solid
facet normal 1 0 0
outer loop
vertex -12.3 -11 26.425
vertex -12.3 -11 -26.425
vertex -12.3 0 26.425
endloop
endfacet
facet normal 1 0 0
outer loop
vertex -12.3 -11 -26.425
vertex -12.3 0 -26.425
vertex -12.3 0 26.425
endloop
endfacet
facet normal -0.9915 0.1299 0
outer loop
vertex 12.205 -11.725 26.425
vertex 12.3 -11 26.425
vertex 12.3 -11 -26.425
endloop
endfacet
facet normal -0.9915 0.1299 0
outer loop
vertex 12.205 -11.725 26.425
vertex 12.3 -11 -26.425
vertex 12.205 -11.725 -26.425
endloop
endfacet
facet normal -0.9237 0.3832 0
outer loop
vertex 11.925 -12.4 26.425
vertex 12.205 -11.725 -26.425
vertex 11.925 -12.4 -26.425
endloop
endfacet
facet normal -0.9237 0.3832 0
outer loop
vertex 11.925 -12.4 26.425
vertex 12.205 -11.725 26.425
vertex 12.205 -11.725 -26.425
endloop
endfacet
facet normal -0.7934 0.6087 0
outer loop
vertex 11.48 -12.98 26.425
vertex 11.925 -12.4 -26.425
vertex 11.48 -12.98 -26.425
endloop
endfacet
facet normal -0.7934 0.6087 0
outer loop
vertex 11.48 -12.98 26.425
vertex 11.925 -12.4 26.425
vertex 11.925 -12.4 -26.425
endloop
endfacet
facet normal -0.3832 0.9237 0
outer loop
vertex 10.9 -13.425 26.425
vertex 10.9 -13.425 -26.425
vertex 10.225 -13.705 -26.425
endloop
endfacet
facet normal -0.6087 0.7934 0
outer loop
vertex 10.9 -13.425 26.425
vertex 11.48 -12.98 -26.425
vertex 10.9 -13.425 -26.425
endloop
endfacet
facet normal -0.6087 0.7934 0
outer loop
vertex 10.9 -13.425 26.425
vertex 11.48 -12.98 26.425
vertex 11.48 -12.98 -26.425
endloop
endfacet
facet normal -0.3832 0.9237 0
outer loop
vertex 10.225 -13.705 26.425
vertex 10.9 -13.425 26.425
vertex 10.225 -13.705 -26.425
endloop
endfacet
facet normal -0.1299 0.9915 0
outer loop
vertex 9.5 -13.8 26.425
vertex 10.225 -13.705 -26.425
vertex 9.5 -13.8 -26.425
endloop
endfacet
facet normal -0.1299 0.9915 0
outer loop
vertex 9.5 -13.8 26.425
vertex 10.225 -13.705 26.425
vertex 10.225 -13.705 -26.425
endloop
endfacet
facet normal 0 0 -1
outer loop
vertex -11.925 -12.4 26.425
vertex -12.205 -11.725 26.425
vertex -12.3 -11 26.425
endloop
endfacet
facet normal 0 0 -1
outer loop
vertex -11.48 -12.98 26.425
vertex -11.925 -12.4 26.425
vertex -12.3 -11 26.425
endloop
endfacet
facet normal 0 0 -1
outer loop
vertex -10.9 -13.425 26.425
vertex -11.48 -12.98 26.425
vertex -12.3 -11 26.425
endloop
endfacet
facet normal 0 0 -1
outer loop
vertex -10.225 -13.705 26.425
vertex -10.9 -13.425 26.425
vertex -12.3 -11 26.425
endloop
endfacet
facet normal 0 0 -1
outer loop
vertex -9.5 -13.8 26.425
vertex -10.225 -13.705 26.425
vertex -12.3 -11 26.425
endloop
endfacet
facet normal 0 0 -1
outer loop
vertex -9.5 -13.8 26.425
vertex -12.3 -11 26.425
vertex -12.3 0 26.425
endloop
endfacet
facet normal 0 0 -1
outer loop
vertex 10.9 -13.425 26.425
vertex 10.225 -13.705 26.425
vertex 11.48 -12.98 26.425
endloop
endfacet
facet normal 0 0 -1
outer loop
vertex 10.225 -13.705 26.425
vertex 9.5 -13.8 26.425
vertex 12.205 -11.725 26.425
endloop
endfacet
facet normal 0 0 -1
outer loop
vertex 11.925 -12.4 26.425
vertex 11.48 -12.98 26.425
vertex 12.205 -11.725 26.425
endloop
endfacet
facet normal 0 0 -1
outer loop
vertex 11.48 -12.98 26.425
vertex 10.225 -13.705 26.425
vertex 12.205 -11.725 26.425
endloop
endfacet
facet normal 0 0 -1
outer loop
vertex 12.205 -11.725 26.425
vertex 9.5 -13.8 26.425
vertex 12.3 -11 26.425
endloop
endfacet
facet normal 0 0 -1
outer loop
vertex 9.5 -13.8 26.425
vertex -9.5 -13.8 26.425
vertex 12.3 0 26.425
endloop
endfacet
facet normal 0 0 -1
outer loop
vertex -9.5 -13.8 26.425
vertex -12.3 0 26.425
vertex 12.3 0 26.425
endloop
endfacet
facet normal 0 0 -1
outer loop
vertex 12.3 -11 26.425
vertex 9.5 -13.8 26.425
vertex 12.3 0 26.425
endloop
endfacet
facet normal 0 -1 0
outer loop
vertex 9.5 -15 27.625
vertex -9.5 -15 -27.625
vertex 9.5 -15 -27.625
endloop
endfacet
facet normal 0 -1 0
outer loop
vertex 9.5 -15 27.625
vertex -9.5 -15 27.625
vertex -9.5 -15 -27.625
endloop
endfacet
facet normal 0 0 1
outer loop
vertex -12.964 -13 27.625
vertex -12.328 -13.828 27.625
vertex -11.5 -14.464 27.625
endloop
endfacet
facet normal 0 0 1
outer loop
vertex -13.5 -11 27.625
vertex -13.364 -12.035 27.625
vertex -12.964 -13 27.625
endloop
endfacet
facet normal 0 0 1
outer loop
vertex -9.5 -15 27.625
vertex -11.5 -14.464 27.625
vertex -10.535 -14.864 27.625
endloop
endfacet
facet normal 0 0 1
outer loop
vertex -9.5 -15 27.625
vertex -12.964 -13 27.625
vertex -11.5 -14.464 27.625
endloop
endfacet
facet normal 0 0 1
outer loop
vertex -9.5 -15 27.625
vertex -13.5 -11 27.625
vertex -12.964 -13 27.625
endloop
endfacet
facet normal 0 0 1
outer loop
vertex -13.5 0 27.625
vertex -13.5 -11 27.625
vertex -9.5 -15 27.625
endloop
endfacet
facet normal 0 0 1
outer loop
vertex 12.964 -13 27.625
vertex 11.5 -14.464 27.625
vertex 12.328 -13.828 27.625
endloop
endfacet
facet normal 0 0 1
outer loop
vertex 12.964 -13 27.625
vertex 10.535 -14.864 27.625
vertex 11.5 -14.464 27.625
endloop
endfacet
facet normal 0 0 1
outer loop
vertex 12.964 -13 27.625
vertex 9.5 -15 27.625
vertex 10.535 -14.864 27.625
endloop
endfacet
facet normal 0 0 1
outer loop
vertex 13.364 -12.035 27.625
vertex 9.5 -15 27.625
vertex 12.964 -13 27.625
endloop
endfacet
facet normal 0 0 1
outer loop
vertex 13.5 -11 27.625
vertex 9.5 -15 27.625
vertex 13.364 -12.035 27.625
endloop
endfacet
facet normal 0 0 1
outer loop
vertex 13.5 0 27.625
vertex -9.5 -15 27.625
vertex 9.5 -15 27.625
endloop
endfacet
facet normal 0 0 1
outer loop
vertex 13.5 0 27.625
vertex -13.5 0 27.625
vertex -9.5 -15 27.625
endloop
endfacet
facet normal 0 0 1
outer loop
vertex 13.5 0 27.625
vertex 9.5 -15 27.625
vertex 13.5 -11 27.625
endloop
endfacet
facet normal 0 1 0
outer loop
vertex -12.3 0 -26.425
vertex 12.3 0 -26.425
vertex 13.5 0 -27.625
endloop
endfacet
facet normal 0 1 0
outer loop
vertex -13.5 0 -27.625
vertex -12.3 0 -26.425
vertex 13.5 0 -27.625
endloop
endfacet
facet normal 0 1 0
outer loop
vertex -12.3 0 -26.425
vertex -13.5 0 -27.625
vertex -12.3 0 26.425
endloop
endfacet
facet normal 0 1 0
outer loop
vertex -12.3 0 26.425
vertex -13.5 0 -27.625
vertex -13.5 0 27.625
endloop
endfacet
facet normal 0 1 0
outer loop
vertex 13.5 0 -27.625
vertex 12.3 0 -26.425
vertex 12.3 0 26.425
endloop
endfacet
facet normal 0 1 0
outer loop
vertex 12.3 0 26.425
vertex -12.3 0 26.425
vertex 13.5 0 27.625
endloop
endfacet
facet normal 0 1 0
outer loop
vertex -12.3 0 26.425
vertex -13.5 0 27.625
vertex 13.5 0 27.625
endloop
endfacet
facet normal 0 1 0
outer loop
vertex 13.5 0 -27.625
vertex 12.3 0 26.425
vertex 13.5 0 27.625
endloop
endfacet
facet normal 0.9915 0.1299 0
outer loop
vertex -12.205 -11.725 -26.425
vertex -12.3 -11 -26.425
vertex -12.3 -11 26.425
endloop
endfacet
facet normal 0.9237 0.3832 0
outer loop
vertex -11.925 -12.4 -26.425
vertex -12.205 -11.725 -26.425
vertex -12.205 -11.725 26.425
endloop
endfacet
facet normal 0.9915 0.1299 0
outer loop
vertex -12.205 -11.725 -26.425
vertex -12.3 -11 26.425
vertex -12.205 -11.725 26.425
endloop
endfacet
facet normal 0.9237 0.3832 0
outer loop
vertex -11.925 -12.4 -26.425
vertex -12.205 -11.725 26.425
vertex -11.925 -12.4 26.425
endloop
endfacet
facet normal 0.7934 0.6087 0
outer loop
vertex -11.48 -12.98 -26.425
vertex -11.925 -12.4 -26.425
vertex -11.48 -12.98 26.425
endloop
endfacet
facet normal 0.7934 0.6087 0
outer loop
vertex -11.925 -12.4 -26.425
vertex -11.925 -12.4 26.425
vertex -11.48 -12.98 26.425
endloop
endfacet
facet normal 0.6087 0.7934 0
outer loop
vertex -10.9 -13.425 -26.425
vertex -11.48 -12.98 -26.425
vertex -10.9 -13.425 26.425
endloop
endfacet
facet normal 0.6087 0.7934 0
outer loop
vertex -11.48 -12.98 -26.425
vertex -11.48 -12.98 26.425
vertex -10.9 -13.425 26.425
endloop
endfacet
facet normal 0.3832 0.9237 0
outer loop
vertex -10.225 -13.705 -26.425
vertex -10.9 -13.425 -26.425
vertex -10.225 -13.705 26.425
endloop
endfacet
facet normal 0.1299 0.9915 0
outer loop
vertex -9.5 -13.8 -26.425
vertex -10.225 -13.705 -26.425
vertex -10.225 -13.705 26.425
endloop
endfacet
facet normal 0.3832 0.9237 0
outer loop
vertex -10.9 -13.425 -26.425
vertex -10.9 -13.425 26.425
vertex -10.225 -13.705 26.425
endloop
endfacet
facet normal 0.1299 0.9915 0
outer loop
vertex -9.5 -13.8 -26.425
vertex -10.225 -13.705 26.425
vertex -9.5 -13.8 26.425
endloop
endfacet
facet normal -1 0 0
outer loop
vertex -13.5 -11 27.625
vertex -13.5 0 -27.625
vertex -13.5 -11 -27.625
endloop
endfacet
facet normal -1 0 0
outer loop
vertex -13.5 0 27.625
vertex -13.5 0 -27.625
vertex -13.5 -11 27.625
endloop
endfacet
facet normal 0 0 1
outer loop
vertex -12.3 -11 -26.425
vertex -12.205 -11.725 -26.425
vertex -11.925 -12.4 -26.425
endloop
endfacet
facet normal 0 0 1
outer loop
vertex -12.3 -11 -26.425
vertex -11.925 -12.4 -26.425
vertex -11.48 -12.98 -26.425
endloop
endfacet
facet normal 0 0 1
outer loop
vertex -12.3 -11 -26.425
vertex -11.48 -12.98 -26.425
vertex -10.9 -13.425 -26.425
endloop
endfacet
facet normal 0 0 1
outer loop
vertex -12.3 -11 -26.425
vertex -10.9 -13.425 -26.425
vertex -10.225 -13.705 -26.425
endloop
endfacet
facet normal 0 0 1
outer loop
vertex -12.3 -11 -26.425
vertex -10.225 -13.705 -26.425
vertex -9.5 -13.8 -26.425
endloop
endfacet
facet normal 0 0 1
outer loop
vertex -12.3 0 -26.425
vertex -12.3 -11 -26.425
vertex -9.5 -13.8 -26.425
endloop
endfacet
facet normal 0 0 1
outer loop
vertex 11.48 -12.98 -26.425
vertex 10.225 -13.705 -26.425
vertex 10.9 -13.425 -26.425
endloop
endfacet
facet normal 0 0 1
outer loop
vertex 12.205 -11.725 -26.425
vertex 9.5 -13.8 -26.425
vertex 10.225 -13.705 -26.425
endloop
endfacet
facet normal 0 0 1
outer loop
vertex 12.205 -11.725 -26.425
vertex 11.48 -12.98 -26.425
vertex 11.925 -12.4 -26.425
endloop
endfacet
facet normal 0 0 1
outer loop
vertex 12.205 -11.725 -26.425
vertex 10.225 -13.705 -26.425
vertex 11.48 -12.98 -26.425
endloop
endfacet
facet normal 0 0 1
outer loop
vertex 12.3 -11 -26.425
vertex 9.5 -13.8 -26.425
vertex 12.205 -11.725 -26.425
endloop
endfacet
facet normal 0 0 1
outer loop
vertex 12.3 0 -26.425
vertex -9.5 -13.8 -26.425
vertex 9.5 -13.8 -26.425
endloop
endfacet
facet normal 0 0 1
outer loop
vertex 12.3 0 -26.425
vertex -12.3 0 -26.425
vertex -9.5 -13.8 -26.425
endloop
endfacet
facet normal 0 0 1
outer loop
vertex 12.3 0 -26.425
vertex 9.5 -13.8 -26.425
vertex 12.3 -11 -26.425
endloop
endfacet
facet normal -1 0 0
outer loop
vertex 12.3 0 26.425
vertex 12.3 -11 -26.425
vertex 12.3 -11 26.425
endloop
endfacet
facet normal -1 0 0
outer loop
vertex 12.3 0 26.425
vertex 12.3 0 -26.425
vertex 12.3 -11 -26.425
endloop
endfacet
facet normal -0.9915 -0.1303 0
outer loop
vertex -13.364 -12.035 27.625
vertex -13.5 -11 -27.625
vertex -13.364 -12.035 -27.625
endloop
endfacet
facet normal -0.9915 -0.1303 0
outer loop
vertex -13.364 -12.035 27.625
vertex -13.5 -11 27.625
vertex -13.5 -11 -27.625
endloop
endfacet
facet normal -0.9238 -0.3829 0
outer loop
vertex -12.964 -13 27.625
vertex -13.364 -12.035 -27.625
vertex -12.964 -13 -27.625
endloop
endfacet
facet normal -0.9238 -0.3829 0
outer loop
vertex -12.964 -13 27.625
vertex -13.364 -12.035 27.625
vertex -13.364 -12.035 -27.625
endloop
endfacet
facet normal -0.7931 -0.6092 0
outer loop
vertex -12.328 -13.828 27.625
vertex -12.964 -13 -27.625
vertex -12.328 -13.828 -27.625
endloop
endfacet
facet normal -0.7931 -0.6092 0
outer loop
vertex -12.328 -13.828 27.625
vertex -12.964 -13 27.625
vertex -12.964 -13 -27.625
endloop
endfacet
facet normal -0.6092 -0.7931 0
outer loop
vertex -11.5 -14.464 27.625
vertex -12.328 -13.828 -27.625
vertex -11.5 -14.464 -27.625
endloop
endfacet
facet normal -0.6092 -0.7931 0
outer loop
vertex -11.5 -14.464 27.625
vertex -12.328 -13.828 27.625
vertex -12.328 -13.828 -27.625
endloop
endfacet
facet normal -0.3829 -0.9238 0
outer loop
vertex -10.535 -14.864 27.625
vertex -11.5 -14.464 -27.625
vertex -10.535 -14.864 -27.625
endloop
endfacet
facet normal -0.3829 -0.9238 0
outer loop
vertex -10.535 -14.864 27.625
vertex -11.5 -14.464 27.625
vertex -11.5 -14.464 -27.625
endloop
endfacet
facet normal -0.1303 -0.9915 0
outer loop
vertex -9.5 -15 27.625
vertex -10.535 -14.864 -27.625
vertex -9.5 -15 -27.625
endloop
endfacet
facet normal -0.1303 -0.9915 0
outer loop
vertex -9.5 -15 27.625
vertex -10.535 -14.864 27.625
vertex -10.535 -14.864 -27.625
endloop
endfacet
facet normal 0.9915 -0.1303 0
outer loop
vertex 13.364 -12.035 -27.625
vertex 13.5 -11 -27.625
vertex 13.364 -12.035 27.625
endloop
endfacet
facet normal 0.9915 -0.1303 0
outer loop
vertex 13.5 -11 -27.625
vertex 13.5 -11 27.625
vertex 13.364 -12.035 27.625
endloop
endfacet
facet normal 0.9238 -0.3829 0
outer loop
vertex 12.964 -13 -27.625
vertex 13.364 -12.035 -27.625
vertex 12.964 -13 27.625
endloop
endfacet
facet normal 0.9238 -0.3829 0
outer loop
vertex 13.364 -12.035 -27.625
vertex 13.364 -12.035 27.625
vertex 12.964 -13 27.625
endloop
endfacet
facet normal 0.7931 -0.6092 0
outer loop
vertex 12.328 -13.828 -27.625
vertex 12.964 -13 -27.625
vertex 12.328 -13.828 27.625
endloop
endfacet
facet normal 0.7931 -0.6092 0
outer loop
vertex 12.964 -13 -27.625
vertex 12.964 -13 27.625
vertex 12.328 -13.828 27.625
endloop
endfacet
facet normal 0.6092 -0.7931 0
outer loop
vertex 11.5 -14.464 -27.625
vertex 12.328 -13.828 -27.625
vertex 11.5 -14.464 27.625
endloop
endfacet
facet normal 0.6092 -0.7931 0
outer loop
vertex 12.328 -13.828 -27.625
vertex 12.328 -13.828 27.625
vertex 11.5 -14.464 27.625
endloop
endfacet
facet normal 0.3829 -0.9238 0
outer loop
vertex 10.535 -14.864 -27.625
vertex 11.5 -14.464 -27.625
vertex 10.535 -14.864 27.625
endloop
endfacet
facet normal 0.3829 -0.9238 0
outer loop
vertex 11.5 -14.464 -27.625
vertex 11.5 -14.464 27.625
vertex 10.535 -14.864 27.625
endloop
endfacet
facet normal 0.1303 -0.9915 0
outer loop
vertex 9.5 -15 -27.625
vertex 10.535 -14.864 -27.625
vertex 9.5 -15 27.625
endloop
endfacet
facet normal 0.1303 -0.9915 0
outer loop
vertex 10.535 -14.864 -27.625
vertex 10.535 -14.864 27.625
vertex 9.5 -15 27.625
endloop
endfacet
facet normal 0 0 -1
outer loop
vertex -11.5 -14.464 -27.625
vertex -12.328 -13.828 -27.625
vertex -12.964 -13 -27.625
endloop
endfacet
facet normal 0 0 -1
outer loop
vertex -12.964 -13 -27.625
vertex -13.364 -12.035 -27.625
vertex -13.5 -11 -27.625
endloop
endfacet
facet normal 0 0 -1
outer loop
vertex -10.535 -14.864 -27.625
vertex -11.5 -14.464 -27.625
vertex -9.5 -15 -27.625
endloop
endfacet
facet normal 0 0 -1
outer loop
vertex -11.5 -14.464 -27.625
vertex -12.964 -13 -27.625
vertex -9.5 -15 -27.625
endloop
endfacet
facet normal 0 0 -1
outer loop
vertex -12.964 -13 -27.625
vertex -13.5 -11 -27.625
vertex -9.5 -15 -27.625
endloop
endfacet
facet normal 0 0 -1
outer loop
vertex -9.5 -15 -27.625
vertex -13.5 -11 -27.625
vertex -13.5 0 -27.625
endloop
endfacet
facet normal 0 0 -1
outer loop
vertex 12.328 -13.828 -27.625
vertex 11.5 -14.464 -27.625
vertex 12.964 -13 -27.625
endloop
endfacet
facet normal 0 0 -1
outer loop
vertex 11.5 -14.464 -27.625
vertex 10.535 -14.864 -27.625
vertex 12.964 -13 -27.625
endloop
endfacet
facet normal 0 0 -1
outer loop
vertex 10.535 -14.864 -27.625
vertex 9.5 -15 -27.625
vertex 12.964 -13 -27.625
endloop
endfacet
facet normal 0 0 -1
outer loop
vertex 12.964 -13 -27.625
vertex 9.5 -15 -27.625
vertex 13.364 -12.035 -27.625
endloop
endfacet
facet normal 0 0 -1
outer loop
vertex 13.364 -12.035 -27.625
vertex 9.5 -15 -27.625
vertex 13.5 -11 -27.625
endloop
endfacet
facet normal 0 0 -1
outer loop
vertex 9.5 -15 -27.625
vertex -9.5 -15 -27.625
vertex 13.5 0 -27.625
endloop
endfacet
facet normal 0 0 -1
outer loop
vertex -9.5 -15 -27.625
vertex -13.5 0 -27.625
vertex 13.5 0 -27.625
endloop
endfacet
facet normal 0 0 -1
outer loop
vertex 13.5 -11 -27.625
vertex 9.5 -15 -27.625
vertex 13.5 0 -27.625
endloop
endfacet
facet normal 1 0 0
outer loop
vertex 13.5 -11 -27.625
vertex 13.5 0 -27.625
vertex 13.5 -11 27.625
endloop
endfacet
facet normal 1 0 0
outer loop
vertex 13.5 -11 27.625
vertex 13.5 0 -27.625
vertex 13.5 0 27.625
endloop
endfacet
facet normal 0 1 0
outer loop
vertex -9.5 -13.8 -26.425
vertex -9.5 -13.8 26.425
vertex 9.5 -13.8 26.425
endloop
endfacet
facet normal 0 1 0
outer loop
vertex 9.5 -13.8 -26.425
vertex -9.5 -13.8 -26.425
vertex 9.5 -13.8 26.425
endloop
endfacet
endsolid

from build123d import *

# Parameters (mm, degrees)
F0_W     = 27
F0_H     = 55.25
F1_DEPTH = 15
F2_R     = 4
F3_T     = -1.2


with BuildPart() as f1:
    # F0 (on Front) → F1 (new body)
    with BuildSketch(Plane.XZ):
        Rectangle(F0_W, F0_H)
    extrude(amount=F1_DEPTH)

    # F2
    f2_edges = [f1.edges().sort_by_distance(p)[0] for p in [
        (13.5, -15, 0),
        (-13.5, -15, 0),
    ]]
    fillet(f2_edges, radius=F2_R)

    # F3
    f3_openings = [f1.faces().sort_by_distance(p)[0] for p in [
        (0, 0, 0),
    ]]
    offset(amount=F3_T, openings=f3_openings)


solid = f1.part
